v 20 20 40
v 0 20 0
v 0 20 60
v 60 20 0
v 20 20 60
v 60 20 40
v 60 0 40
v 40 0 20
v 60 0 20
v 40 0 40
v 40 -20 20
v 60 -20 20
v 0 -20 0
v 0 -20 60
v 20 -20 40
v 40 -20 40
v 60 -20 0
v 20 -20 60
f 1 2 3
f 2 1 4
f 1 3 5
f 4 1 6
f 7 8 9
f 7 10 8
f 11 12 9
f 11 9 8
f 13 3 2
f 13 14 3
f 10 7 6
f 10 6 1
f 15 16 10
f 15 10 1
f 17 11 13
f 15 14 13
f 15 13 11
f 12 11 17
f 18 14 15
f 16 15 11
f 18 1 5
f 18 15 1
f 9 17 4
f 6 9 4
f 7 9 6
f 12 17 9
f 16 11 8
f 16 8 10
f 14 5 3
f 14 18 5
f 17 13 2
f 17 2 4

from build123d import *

# Parameters (mm, degrees)
F1_DEPTH = 20
F0_W     = 20
F0_H     = 20
F2_DEPTH = 20


with BuildPart() as f1:
    # F0 (on Front) → F1 (new body, symmetric)
    with BuildSketch(Plane.XZ):
        Polygon((0, 60), (0, 0), (60, 0), (60, 20), (40, 20), (40, 40), (20, 40), (20, 60), align=None)
    extrude(amount=F1_DEPTH, both=True)

    # F0 (on Front) → F2 (join)
    with BuildSketch(Plane.XZ):
        Polygon((0, 60), (0, 0), (60, 0), (60, 20), (40, 20), (40, 40), (20, 40), (20, 60), align=None)
        with Locations((50, 30)):
            Rectangle(F0_W, F0_H)
    extrude(amount=-F2_DEPTH)


solid = f1.part
